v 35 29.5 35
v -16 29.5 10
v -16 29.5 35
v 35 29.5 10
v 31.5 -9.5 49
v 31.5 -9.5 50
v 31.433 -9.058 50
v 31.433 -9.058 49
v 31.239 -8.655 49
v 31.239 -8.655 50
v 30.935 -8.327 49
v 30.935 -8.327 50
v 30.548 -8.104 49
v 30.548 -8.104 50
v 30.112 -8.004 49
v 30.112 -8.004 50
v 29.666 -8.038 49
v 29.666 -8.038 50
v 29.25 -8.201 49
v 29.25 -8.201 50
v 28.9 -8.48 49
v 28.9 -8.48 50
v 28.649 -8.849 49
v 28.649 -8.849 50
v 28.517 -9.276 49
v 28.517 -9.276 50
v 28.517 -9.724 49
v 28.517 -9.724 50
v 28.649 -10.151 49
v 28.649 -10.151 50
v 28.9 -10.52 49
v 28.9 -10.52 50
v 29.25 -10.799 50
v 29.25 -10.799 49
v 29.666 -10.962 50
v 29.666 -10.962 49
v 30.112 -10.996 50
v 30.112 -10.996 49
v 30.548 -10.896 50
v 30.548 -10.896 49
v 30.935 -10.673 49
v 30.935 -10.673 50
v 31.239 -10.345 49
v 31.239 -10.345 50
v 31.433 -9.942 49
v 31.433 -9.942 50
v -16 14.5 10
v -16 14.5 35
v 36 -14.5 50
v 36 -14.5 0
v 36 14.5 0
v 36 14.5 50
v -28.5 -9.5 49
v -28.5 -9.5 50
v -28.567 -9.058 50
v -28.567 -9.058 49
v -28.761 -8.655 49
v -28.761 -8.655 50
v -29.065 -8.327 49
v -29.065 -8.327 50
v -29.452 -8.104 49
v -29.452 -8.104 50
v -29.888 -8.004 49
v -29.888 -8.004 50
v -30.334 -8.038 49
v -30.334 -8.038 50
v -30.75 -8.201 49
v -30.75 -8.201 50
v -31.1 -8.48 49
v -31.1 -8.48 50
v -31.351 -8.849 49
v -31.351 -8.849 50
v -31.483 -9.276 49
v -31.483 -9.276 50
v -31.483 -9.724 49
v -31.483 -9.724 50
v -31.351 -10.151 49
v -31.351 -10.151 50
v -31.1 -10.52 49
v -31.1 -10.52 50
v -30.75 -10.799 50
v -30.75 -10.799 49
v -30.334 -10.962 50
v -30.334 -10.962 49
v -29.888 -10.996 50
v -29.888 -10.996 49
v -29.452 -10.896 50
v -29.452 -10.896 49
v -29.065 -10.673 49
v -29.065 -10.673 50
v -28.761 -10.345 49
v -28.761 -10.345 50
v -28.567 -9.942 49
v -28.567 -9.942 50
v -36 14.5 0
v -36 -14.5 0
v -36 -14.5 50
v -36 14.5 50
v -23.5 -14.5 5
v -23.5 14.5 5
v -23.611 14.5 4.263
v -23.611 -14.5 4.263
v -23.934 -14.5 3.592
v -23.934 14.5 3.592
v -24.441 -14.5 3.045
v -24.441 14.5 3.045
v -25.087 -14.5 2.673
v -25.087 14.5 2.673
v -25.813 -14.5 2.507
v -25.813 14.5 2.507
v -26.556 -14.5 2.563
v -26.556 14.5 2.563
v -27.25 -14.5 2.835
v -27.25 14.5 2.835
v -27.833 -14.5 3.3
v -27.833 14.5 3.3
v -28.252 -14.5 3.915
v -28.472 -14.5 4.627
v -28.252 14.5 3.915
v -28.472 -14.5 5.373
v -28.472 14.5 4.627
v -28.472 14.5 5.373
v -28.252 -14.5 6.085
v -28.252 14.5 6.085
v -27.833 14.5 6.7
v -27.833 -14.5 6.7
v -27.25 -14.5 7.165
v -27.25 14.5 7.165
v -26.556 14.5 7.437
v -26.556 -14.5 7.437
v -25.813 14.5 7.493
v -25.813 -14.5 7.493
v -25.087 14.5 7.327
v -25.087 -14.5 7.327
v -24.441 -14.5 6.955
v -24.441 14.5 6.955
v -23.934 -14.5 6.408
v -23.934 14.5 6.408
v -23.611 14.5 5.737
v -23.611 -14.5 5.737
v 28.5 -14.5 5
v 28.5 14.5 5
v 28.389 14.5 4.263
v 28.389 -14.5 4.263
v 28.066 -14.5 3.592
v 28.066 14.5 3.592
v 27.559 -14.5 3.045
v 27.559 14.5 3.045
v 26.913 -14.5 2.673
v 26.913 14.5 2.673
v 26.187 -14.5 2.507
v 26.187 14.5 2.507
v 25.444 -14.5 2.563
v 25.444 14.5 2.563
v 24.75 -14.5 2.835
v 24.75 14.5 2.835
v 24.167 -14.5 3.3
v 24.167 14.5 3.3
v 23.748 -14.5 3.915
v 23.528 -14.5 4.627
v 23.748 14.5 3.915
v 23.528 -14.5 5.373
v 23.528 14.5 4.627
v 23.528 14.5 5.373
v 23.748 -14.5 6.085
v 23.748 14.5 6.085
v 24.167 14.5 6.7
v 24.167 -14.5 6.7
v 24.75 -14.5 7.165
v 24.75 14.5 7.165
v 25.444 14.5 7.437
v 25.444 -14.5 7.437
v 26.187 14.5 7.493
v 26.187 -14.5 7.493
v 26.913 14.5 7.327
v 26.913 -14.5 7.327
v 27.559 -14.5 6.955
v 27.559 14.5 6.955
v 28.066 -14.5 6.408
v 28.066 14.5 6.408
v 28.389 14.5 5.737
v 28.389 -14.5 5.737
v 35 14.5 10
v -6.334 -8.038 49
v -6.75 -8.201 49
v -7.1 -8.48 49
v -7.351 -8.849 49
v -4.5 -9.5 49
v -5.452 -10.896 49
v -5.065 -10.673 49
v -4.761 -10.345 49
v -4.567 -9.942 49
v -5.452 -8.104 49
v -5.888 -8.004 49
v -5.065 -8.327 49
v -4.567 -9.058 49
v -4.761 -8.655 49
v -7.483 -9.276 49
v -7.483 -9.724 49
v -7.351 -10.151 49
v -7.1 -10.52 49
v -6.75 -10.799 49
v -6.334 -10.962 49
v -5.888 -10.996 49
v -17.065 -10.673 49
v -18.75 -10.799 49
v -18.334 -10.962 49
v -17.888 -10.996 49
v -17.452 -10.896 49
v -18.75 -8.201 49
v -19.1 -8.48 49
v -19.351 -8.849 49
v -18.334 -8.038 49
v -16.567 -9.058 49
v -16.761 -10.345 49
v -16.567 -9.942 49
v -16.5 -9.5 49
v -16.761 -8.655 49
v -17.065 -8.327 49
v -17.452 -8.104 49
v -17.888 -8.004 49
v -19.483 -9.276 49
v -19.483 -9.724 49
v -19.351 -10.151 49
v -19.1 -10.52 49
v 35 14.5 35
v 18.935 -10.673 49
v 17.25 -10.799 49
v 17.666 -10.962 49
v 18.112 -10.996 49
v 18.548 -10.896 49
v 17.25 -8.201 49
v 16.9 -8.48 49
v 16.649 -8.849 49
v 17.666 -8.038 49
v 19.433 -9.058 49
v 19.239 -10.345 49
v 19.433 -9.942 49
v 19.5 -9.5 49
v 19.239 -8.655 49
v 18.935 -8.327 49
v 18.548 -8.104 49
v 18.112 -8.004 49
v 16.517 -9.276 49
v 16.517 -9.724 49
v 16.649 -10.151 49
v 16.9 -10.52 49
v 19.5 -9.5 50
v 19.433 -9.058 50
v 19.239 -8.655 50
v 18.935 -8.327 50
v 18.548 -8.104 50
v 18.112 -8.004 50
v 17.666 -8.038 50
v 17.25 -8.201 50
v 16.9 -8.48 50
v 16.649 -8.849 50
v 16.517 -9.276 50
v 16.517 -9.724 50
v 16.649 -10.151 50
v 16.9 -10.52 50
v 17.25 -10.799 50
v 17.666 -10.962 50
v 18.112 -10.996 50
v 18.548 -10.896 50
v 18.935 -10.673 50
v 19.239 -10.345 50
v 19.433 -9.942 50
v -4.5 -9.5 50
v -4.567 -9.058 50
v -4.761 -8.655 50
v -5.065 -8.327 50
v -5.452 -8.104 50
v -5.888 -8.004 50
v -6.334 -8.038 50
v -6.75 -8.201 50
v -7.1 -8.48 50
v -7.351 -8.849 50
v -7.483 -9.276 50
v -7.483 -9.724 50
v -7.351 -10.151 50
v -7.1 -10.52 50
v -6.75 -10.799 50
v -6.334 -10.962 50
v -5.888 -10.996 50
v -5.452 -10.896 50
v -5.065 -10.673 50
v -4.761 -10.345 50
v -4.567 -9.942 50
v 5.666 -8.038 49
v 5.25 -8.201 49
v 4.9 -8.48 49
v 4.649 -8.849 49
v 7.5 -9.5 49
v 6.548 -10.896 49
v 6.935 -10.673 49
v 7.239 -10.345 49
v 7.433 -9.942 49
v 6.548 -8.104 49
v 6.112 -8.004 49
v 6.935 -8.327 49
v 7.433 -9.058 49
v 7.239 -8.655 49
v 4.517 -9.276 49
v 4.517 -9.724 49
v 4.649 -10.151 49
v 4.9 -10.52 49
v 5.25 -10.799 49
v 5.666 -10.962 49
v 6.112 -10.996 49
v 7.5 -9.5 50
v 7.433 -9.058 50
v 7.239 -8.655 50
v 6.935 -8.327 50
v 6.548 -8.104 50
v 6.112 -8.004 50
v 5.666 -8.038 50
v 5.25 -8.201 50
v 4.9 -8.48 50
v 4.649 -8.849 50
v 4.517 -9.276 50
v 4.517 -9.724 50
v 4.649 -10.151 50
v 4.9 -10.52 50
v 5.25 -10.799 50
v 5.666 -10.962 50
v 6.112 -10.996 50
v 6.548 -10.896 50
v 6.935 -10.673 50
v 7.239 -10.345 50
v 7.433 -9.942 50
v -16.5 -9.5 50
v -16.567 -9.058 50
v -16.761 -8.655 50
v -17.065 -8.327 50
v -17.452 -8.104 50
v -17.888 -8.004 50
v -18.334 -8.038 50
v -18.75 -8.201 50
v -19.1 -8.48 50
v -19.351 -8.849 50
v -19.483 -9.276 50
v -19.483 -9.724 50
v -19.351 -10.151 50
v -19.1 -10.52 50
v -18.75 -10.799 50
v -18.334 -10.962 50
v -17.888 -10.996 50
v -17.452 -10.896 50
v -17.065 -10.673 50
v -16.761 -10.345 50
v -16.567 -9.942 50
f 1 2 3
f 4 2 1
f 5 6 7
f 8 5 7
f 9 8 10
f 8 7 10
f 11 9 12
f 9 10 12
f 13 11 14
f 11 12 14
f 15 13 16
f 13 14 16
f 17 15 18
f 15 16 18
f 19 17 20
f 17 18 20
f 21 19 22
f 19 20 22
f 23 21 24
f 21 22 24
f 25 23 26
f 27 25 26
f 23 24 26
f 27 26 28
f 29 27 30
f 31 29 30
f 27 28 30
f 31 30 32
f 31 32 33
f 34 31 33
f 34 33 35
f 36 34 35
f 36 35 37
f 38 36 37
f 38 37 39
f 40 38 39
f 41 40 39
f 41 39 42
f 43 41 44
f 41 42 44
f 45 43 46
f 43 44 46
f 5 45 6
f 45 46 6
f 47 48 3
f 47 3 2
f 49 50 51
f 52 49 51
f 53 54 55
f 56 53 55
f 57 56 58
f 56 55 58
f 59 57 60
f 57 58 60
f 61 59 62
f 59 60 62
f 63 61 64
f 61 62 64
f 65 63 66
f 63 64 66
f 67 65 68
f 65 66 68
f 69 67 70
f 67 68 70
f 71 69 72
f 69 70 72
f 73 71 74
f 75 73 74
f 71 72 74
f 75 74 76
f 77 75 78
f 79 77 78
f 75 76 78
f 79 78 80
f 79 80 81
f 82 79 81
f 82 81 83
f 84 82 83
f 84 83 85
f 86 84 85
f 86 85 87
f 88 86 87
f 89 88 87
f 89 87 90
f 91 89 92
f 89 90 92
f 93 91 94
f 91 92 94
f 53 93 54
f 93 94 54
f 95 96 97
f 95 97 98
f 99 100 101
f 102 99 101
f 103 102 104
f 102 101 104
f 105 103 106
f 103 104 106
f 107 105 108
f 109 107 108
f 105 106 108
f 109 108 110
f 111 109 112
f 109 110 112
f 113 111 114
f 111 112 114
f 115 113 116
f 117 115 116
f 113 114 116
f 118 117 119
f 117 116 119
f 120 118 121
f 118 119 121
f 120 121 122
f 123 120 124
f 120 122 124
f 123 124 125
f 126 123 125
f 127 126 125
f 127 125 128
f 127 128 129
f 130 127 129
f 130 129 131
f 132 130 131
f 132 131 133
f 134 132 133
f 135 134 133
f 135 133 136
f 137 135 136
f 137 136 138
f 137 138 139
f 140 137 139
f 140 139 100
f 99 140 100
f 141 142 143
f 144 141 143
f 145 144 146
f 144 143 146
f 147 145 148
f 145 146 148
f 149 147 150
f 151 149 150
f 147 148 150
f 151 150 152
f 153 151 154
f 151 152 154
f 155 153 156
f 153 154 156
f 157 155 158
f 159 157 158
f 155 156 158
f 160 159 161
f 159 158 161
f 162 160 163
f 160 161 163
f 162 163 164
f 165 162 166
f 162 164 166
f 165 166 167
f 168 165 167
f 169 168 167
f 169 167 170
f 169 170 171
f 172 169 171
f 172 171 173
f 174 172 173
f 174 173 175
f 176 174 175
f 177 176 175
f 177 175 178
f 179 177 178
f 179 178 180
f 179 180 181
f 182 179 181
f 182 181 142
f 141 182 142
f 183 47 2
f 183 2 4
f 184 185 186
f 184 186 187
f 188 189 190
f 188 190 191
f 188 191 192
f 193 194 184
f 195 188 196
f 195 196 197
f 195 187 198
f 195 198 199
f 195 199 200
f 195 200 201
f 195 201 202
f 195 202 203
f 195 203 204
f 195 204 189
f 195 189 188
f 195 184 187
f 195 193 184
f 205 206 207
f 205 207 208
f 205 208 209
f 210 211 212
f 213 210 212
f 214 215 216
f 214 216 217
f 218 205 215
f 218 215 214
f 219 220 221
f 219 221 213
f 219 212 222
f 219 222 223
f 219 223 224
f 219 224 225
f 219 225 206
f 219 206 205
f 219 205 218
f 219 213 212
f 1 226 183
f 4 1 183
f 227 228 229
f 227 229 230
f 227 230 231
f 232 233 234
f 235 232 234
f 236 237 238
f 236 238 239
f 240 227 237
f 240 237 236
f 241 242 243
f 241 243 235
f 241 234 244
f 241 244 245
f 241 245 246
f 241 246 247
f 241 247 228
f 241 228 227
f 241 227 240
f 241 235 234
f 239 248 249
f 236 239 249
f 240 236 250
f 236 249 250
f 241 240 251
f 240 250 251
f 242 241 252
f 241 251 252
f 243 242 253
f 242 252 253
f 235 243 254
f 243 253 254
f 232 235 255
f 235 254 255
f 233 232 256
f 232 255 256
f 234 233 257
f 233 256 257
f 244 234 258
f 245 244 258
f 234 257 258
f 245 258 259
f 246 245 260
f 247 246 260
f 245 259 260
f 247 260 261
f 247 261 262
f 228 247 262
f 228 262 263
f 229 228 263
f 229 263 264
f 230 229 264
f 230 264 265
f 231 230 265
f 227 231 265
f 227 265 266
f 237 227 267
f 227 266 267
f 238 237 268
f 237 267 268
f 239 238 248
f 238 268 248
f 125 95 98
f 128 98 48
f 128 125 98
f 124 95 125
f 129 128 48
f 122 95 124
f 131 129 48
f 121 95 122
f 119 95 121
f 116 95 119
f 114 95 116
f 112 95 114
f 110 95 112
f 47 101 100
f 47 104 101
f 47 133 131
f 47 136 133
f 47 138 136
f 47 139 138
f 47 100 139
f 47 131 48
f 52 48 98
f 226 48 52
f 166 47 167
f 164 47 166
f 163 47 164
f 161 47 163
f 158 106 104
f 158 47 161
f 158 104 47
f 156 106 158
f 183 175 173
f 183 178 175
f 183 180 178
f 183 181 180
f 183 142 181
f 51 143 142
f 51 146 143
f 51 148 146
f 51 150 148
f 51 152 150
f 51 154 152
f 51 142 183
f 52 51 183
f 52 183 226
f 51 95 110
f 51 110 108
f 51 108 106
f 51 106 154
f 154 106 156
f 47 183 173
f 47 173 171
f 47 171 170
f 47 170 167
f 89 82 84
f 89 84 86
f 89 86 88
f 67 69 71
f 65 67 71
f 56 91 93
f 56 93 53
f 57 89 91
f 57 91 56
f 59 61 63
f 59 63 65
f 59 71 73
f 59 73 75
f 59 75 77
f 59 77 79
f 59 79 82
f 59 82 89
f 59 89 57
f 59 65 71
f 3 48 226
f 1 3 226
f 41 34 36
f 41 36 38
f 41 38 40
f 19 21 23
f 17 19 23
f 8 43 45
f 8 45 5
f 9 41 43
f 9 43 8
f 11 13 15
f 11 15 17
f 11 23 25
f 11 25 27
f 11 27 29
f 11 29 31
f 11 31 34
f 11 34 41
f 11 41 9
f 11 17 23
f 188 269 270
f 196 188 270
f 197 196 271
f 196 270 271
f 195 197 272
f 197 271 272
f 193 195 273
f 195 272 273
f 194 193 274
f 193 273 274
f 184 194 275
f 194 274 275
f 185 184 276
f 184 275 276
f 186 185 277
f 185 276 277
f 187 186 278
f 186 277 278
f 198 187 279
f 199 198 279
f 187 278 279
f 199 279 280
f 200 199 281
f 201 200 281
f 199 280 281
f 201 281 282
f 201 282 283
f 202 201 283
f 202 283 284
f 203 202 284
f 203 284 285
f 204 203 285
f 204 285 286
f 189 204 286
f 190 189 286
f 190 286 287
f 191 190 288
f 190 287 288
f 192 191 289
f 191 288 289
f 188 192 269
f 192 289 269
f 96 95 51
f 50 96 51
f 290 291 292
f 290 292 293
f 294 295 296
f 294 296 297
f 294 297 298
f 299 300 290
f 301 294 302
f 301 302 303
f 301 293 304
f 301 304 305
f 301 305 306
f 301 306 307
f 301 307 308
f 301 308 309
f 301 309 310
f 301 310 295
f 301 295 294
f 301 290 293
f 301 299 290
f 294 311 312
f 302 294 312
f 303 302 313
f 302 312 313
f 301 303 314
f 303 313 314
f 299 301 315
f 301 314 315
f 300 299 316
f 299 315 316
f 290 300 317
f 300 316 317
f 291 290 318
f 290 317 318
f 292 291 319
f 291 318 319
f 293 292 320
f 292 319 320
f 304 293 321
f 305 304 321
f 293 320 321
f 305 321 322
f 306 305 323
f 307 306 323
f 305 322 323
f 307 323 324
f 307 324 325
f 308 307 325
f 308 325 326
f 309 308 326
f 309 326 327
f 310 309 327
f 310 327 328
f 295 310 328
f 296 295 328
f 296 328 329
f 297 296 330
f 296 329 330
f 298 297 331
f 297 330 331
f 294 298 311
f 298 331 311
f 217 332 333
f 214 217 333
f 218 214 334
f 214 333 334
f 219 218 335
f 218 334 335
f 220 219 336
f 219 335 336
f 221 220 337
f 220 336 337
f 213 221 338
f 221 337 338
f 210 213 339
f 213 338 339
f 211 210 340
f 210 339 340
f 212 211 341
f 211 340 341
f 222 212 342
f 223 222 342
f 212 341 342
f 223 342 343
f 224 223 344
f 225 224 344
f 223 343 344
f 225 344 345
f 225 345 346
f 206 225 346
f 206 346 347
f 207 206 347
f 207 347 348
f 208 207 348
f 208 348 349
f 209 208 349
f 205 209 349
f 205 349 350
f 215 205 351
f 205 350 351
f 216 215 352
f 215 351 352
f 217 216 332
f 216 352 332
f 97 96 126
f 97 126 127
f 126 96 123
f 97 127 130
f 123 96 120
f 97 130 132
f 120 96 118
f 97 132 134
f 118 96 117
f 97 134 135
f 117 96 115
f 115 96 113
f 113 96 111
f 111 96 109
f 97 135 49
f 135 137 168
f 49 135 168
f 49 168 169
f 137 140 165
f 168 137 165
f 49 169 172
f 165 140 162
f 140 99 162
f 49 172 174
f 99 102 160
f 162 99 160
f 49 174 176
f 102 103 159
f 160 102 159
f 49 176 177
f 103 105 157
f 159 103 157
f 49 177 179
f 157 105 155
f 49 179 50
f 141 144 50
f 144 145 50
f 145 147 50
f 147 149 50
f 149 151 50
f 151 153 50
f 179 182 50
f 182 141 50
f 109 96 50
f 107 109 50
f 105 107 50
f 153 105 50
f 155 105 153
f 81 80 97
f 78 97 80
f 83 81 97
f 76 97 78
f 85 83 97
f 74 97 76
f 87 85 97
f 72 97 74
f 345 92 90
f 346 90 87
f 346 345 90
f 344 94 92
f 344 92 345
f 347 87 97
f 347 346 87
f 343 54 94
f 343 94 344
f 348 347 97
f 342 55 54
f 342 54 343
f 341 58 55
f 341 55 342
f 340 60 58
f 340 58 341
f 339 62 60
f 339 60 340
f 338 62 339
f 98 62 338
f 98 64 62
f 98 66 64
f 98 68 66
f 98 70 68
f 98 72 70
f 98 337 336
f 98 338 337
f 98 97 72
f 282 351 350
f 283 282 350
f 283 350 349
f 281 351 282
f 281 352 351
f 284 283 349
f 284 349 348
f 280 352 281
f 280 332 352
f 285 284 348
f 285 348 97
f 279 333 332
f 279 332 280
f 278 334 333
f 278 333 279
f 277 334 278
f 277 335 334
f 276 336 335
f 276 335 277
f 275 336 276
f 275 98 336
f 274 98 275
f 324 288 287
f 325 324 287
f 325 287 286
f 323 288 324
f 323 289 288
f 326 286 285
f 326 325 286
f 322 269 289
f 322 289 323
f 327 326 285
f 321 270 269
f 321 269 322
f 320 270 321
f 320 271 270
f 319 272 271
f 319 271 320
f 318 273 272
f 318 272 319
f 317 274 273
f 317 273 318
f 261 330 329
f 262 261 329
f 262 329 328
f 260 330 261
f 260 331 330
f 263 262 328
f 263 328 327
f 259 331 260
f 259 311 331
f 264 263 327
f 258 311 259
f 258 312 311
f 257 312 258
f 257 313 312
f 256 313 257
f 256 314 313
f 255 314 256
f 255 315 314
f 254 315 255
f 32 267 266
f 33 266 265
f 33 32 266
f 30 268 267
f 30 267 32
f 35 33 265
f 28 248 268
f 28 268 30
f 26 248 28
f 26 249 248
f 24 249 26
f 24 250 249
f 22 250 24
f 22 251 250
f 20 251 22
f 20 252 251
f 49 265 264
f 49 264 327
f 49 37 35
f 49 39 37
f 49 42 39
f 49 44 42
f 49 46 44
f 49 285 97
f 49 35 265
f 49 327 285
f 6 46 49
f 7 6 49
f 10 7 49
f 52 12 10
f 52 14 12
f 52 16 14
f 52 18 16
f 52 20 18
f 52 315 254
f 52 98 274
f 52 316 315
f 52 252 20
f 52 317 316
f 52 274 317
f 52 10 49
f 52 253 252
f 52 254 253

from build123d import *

# Parameters (mm, degrees)
SKETCH1_W               = 72
SKETCH1_H               = 29
BOSS_EXTRUDE1_DEPTH     = 50
SKETCH3_R               = 2.5
SKETCH3_W               = 51
SKETCH3_H               = 25
BOSS_EXTRUDE3_DEPTH     = 15
SKETCH2_R               = 1.5
CUT_EXTRUDE1_DEPTH      = 1
SKETCH4_R               = 2.5
CUT_EXTRUDE2_DEPTH      = 40
CUT_EXTRUDE2_DEPTH_BACK = 40


with BuildPart() as part:
    # Sketch1 → Boss-Extrude1 (new body)
    with BuildSketch(Plane.XY):
        Rectangle(SKETCH1_W, SKETCH1_H)
    extrude(amount=BOSS_EXTRUDE1_DEPTH)

    # Sketch3 → Boss-Extrude3 (add)
    with BuildSketch(Plane(origin=(0, 14.5, 0), x_dir=(1, 0, 0), z_dir=(0, 1, 0))):
        with Locations((-26, -5)):
            Circle(SKETCH3_R)
        with Locations((26, -5)):
            Circle(SKETCH3_R)
        with Locations((9.5, -22.5)):
            Rectangle(SKETCH3_W, SKETCH3_H)
    extrude(amount=BOSS_EXTRUDE3_DEPTH)

    # Sketch2 → Cut-Extrude1 (cut)
    with BuildSketch(Plane.XY.offset(50)):
        with Locations((-30, -9.5)):
            Circle(SKETCH2_R)
        with Locations((-18, -9.5)):
            Circle(SKETCH2_R)
        with Locations((-6, -9.5)):
            Circle(SKETCH2_R)
        with Locations((6, -9.5)):
            Circle(SKETCH2_R)
        with Locations((18, -9.5)):
            Circle(SKETCH2_R)
        with Locations((30, -9.5)):
            Circle(SKETCH2_R)
    extrude(amount=-CUT_EXTRUDE1_DEPTH, mode=Mode.SUBTRACT)

    # Sketch4 → Cut-Extrude2 (cut, two sides)
    with BuildSketch(Plane(origin=(0, 14.5, 0), x_dir=(1, 0, 0), z_dir=(0, 1, 0))) as cut_extrude2_sk:
        with Locations((26, -5)):
            Circle(SKETCH4_R)
        with Locations((-26, -5)):
            Circle(SKETCH4_R)
    extrude(amount=CUT_EXTRUDE2_DEPTH, mode=Mode.SUBTRACT)
    extrude(cut_extrude2_sk.sketch, amount=-CUT_EXTRUDE2_DEPTH_BACK, mode=Mode.SUBTRACT)


solid = part.part
